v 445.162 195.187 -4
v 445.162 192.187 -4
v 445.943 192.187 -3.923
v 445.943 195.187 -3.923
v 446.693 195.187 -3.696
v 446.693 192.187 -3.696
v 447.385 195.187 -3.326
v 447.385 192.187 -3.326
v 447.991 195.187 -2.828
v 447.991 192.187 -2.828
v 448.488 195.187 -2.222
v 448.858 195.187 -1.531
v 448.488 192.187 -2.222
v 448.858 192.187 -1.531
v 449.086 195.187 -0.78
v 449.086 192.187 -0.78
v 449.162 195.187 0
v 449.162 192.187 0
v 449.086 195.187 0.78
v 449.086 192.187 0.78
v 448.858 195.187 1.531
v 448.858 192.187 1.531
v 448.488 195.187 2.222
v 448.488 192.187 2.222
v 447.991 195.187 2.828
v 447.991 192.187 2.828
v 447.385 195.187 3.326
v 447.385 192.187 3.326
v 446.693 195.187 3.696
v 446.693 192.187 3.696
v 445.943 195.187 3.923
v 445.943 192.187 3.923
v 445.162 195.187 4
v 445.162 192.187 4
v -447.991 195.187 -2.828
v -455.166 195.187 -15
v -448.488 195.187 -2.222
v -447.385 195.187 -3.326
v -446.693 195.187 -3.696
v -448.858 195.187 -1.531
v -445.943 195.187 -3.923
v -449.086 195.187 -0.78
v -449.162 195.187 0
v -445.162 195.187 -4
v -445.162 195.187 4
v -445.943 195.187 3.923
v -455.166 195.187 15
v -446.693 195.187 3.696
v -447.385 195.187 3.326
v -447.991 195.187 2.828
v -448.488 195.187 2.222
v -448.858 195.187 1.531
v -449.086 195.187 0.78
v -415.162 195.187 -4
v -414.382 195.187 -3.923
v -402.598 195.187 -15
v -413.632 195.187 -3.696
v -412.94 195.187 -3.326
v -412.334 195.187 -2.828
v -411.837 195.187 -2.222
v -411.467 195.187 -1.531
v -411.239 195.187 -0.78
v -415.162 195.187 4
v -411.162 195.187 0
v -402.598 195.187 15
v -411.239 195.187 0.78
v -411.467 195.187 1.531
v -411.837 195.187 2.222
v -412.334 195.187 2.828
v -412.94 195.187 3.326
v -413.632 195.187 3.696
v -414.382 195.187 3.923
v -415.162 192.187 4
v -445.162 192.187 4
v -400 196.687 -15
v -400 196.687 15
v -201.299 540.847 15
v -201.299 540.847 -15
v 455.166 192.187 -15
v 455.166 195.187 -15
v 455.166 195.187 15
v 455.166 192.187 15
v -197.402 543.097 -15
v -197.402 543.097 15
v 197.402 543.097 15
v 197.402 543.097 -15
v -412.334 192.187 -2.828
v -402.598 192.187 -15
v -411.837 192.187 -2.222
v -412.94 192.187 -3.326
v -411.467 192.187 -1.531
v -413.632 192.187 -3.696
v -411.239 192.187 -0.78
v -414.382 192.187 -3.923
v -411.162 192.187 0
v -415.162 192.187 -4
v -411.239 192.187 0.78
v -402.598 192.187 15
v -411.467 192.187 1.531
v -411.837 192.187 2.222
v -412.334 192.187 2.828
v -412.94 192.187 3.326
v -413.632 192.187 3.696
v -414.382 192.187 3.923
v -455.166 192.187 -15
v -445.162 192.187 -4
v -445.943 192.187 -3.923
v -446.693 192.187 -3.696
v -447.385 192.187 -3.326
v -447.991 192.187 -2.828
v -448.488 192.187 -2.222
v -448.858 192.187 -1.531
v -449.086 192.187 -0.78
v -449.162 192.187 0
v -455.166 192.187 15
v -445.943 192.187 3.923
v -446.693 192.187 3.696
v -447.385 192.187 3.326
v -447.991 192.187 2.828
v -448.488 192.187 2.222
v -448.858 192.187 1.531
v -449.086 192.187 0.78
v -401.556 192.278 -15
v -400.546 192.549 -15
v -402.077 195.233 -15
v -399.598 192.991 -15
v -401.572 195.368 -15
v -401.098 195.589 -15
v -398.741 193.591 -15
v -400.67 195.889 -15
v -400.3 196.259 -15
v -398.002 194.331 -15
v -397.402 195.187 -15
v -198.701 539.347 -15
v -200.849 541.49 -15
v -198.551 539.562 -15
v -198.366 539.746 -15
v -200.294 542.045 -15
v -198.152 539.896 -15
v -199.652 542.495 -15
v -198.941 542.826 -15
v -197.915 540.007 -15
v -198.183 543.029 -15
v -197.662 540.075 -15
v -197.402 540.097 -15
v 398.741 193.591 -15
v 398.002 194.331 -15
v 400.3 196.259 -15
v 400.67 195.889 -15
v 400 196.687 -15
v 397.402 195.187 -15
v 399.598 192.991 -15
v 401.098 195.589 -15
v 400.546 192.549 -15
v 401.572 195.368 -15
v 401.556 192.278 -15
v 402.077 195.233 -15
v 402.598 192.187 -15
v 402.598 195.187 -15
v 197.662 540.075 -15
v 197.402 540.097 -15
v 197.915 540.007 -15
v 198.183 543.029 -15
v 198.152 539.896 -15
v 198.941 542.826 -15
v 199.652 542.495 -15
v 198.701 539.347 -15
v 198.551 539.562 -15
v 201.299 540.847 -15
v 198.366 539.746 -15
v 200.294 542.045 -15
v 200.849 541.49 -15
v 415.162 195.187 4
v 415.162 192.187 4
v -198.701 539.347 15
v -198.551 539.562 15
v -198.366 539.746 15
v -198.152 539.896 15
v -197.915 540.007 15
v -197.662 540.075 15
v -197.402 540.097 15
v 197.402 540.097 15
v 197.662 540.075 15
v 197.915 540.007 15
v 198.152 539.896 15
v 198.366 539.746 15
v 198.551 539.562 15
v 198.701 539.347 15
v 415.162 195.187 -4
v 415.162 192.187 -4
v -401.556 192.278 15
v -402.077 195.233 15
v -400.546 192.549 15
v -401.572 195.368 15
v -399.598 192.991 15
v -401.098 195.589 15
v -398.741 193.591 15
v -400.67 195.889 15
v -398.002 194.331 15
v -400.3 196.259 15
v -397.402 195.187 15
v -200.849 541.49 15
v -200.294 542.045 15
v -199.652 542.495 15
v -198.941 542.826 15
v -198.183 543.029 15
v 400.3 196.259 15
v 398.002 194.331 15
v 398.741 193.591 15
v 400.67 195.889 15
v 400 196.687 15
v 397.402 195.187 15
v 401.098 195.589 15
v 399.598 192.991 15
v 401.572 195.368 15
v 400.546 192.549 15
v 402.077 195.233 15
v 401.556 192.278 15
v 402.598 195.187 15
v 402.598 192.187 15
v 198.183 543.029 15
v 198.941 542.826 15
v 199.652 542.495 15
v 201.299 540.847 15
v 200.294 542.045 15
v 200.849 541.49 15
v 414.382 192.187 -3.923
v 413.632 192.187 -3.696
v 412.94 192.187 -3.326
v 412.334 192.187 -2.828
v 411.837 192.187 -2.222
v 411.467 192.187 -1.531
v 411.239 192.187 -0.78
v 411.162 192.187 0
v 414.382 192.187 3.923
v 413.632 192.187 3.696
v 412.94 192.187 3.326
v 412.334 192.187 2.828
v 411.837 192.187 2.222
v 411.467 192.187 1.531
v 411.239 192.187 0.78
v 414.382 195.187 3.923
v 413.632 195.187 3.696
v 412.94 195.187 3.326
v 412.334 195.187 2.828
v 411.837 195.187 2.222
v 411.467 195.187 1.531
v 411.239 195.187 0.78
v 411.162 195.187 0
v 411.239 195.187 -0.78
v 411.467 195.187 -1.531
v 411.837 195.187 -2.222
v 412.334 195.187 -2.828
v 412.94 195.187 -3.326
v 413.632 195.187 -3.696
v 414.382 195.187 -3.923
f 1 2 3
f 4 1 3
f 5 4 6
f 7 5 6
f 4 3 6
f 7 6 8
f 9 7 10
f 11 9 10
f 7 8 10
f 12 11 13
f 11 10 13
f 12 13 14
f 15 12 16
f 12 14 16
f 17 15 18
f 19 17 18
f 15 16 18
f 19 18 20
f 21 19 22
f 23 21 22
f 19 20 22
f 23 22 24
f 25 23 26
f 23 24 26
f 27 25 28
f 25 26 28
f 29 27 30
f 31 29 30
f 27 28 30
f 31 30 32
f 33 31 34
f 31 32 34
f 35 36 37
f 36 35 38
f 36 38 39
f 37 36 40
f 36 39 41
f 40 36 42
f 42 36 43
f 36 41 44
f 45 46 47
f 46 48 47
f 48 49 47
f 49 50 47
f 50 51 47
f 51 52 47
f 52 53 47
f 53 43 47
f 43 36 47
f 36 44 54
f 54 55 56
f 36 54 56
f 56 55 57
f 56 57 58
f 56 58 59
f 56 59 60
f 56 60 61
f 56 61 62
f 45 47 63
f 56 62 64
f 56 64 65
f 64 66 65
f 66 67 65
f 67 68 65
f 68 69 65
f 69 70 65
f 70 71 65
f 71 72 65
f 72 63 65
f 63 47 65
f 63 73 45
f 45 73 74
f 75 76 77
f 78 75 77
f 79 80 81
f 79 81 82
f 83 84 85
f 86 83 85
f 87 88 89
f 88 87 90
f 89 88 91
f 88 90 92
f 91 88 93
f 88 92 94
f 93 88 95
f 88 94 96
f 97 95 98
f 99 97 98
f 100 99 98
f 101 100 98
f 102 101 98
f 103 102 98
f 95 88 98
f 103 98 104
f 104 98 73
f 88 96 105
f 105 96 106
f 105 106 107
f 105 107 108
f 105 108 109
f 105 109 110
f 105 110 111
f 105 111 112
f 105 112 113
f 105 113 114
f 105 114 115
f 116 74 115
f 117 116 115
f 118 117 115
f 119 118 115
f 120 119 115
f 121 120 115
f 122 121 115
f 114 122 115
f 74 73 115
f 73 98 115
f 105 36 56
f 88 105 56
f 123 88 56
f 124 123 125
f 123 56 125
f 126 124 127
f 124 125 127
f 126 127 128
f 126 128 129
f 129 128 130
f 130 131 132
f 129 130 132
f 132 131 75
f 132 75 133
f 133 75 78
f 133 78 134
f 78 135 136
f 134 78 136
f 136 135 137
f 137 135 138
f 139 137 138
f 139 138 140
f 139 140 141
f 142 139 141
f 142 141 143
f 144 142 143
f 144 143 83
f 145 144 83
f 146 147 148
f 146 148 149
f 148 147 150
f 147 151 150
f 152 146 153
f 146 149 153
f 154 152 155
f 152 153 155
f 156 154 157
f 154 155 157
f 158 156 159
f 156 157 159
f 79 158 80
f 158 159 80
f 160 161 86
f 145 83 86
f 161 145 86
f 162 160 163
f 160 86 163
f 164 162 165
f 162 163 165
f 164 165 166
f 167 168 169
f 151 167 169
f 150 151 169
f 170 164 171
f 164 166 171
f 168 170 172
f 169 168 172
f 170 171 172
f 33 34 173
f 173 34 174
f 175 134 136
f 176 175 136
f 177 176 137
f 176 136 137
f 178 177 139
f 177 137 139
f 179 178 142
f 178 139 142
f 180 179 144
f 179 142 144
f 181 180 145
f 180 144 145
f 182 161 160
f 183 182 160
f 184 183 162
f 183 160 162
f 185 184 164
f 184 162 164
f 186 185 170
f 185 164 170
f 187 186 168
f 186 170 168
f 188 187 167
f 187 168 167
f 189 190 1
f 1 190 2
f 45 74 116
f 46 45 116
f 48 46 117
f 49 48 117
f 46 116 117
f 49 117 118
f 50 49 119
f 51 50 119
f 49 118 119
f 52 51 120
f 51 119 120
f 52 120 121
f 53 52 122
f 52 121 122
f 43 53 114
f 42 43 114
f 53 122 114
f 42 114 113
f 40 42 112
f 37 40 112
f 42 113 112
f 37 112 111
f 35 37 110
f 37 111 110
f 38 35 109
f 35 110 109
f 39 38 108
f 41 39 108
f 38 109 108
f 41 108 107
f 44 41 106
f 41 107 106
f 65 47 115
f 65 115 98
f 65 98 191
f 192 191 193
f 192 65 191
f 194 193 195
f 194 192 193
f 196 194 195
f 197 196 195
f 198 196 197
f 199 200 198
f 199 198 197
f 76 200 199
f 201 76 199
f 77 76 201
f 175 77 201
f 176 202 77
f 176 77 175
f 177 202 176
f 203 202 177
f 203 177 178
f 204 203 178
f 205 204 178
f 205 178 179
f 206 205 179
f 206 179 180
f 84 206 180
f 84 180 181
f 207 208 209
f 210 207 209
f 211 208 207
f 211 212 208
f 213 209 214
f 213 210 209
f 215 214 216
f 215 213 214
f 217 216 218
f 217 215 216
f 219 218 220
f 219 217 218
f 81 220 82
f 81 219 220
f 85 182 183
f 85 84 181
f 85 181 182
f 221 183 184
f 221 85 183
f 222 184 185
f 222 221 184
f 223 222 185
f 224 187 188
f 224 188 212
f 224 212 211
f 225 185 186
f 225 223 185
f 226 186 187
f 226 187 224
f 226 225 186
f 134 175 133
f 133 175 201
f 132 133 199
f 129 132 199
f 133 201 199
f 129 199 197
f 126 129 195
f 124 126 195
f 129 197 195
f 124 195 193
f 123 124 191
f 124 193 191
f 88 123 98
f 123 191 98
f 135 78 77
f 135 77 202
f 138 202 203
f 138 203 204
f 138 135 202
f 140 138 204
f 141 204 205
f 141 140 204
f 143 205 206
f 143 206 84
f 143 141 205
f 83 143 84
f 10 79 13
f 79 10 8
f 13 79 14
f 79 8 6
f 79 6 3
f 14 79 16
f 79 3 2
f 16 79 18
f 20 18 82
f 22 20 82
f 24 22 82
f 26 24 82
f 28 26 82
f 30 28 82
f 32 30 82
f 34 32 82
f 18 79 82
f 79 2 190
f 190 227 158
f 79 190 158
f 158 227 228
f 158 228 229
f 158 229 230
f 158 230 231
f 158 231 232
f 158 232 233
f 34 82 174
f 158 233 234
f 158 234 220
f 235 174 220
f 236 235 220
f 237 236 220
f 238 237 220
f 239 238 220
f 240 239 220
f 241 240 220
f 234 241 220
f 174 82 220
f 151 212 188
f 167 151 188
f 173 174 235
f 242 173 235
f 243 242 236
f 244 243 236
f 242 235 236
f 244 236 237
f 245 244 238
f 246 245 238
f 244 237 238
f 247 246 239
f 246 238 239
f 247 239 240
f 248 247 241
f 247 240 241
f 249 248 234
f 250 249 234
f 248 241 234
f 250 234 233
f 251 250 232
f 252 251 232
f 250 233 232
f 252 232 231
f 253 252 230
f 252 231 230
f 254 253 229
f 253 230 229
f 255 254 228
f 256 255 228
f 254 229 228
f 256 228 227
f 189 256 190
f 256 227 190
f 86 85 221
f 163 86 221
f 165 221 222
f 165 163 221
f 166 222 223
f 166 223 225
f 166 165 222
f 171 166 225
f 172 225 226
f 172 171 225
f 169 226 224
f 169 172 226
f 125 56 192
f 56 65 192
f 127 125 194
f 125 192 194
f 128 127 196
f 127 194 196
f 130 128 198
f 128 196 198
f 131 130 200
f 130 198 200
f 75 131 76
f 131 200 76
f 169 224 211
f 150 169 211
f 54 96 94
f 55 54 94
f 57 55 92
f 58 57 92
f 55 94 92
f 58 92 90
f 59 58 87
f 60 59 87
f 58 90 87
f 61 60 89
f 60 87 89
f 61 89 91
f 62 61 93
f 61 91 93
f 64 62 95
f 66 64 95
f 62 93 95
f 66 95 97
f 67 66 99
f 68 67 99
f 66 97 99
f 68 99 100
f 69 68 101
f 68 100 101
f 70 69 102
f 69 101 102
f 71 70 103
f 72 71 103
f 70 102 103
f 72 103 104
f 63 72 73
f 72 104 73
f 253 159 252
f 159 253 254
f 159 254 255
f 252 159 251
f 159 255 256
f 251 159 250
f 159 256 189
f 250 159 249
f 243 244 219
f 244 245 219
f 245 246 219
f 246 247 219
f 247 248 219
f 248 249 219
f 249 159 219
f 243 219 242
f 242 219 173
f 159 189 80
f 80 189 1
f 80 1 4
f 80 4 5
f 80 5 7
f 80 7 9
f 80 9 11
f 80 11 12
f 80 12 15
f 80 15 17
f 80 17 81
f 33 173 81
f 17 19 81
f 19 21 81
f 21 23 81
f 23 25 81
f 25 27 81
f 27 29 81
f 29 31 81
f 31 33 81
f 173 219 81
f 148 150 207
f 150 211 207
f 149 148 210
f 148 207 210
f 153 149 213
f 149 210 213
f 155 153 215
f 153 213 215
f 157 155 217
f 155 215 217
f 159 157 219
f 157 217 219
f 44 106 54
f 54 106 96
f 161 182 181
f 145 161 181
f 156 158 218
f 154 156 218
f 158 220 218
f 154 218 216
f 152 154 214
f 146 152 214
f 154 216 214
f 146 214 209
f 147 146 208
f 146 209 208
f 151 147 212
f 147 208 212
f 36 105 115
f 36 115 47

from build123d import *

# Parameters (mm, degrees)
EXTRUDE_1_DEPTH       = 15
CUT_EXTRUDE_1_REACH   = 576.925
SHEET_START           = -15
SHEET_METAL_2_DEPTH   = 30
SHEET_METAL_2_2_DEPTH = 30


# Read off the part's stored shape, not the designer's step: Преобразовать-Твердое тело2
with BuildPart() as part:
    # Эскиз1 → Вытянуть-Тонкостенный1 (new, symmetric)
    with BuildSketch(Plane.XY):
        with BuildLine():
            Line((-455.166025404, 195.187225691), (-402.598076211, 195.187225691))
            ThreePointArc((-402.598076211, 195.187225691), (-401.098076211, 195.58914948), (-400, 196.687225691))
            Line((-400, 196.687225691), (-200.433012702, 542.347387205))
            ThreePointArc((-200.433012702, 542.347387205), (-199.883974596, 542.896425311), (-199.133974596, 543.097387205))
            Line((-199.133974596, 543.097387205), (199.133974596, 543.097387205))
            ThreePointArc((199.133974596, 543.097387205), (199.883974596, 542.896425311), (200.433012702, 542.347387205))
            Line((200.433012702, 542.347387205), (400, 196.687225691))
            ThreePointArc((400, 196.687225691), (401.098076211, 195.58914948), (402.598076211, 195.187225691))
            Line((402.598076211, 195.187225691), (455.166025404, 195.187225691))
            Line((455.166025404, 195.187225691), (455.166025404, 192.187225691))
            Line((455.166025404, 192.187225691), (402.598076211, 192.187225691))
            ThreePointArc((402.598076211, 192.187225691), (399.598076211, 192.991073269), (397.401923789, 195.187225691))
            Line((397.401923789, 195.187225691), (198.267949192, 540.097387205))
            Line((198.267949192, 540.097387205), (-198.267949192, 540.097387205))
            Line((-198.267949192, 540.097387205), (-397.401923789, 195.187225691))
            ThreePointArc((-397.401923789, 195.187225691), (-399.598076211, 192.991073269), (-402.598076211, 192.187225691))
            Line((-402.598076211, 192.187225691), (-455.166025404, 192.187225691))
            Line((-455.166025404, 192.187225691), (-455.166025404, 195.187225691))
        make_face()
    extrude(amount=EXTRUDE_1_DEPTH, both=True)

    # Эскиз2 → Вырез-Вытянуть1 (cut, up to next)
    with BuildSketch(Plane.XZ.offset(-192.187225691), mode=Mode.PRIVATE) as cut_extrude_1_sk1:
        with BuildLine():
            Line((-445.16238786, -4), (-415.16238786, -4))
            ThreePointArc((-415.16238786, -4), (-411.16238786, 0), (-415.16238786, 4))
            Line((-415.16238786, 4), (-445.16238786, 4))
            ThreePointArc((-445.16238786, 4), (-449.16238786, 0), (-445.16238786, -4))
        make_face()
    cut_extrude_1_tool1 = extrude(cut_extrude_1_sk1.sketch, amount=-CUT_EXTRUDE_1_REACH, mode=Mode.PRIVATE) & part.part
    # Эскиз2 → Вырез-Вытянуть1 (cut, up to next)
    with BuildSketch(Plane.XZ.offset(-192.187225691), mode=Mode.PRIVATE) as cut_extrude_1_sk2:
        with BuildLine():
            Line((445.16238786, 4), (415.16238786, 4))
            ThreePointArc((415.16238786, 4), (411.16238786, 0), (415.16238786, -4))
            Line((415.16238786, -4), (445.16238786, -4))
            ThreePointArc((445.16238786, -4), (449.16238786, 0), (445.16238786, 4))
        make_face()
    cut_extrude_1_tool2 = extrude(cut_extrude_1_sk2.sketch, amount=-CUT_EXTRUDE_1_REACH, mode=Mode.PRIVATE) & part.part
    add(cut_extrude_1_tool1.solids().sort_by_distance((-430.162388, 192.187226, 0))[0], mode=Mode.SUBTRACT)
    add(cut_extrude_1_tool2.solids().sort_by_distance((430.162388, 192.187226, 0))[0], mode=Mode.SUBTRACT)

    # Sheet Metal 2 outline → Sheet Metal 2 (cut)
    with BuildSketch(Plane.XY.offset(SHEET_START)):
        with BuildLine():
            Line((199.133974596, 543.097387205), (197.401923789, 543.097387205))
            ThreePointArc((197.401923789, 543.097387205), (199.651923789, 542.494501522), (201.299038106, 540.847387205))
            Line((201.299038106, 540.847387205), (200.433012702, 542.347387205))
            ThreePointArc((200.433012702, 542.347387205), (199.883974596, 542.896425311), (199.133974596, 543.097387205))
        make_face()
        with BuildLine():
            ThreePointArc((-201.299038106, 540.847387205), (-199.651923789, 542.494501522), (-197.401923789, 543.097387205))
            Line((-197.401923789, 543.097387205), (-199.133974596, 543.097387205))
            ThreePointArc((-199.133974596, 543.097387205), (-199.883974596, 542.896425311), (-200.433012702, 542.347387205))
            Line((-200.433012702, 542.347387205), (-201.299038106, 540.847387205))
        make_face()
    extrude(amount=SHEET_METAL_2_DEPTH, mode=Mode.SUBTRACT)

    # Sheet Metal 2 2 outline → Sheet Metal 2 2 (add)
    with BuildSketch(Plane.XY.offset(SHEET_START)):
        with BuildLine():
            Line((198.267949192, 540.097387205), (197.401923789, 540.097387205))
            ThreePointArc((197.401923789, 540.097387205), (198.151923789, 539.896425311), (198.700961894, 539.347387205))
            Line((198.700961894, 539.347387205), (198.267949192, 540.097387205))
        make_face()
        with BuildLine():
            ThreePointArc((-198.700961894, 539.347387205), (-198.151923789, 539.896425311), (-197.401923789, 540.097387205))
            Line((-197.401923789, 540.097387205), (-198.267949192, 540.097387205))
            Line((-198.267949192, 540.097387205), (-198.700961894, 539.347387205))
        make_face()
    extrude(amount=SHEET_METAL_2_2_DEPTH)


solid = part.part
